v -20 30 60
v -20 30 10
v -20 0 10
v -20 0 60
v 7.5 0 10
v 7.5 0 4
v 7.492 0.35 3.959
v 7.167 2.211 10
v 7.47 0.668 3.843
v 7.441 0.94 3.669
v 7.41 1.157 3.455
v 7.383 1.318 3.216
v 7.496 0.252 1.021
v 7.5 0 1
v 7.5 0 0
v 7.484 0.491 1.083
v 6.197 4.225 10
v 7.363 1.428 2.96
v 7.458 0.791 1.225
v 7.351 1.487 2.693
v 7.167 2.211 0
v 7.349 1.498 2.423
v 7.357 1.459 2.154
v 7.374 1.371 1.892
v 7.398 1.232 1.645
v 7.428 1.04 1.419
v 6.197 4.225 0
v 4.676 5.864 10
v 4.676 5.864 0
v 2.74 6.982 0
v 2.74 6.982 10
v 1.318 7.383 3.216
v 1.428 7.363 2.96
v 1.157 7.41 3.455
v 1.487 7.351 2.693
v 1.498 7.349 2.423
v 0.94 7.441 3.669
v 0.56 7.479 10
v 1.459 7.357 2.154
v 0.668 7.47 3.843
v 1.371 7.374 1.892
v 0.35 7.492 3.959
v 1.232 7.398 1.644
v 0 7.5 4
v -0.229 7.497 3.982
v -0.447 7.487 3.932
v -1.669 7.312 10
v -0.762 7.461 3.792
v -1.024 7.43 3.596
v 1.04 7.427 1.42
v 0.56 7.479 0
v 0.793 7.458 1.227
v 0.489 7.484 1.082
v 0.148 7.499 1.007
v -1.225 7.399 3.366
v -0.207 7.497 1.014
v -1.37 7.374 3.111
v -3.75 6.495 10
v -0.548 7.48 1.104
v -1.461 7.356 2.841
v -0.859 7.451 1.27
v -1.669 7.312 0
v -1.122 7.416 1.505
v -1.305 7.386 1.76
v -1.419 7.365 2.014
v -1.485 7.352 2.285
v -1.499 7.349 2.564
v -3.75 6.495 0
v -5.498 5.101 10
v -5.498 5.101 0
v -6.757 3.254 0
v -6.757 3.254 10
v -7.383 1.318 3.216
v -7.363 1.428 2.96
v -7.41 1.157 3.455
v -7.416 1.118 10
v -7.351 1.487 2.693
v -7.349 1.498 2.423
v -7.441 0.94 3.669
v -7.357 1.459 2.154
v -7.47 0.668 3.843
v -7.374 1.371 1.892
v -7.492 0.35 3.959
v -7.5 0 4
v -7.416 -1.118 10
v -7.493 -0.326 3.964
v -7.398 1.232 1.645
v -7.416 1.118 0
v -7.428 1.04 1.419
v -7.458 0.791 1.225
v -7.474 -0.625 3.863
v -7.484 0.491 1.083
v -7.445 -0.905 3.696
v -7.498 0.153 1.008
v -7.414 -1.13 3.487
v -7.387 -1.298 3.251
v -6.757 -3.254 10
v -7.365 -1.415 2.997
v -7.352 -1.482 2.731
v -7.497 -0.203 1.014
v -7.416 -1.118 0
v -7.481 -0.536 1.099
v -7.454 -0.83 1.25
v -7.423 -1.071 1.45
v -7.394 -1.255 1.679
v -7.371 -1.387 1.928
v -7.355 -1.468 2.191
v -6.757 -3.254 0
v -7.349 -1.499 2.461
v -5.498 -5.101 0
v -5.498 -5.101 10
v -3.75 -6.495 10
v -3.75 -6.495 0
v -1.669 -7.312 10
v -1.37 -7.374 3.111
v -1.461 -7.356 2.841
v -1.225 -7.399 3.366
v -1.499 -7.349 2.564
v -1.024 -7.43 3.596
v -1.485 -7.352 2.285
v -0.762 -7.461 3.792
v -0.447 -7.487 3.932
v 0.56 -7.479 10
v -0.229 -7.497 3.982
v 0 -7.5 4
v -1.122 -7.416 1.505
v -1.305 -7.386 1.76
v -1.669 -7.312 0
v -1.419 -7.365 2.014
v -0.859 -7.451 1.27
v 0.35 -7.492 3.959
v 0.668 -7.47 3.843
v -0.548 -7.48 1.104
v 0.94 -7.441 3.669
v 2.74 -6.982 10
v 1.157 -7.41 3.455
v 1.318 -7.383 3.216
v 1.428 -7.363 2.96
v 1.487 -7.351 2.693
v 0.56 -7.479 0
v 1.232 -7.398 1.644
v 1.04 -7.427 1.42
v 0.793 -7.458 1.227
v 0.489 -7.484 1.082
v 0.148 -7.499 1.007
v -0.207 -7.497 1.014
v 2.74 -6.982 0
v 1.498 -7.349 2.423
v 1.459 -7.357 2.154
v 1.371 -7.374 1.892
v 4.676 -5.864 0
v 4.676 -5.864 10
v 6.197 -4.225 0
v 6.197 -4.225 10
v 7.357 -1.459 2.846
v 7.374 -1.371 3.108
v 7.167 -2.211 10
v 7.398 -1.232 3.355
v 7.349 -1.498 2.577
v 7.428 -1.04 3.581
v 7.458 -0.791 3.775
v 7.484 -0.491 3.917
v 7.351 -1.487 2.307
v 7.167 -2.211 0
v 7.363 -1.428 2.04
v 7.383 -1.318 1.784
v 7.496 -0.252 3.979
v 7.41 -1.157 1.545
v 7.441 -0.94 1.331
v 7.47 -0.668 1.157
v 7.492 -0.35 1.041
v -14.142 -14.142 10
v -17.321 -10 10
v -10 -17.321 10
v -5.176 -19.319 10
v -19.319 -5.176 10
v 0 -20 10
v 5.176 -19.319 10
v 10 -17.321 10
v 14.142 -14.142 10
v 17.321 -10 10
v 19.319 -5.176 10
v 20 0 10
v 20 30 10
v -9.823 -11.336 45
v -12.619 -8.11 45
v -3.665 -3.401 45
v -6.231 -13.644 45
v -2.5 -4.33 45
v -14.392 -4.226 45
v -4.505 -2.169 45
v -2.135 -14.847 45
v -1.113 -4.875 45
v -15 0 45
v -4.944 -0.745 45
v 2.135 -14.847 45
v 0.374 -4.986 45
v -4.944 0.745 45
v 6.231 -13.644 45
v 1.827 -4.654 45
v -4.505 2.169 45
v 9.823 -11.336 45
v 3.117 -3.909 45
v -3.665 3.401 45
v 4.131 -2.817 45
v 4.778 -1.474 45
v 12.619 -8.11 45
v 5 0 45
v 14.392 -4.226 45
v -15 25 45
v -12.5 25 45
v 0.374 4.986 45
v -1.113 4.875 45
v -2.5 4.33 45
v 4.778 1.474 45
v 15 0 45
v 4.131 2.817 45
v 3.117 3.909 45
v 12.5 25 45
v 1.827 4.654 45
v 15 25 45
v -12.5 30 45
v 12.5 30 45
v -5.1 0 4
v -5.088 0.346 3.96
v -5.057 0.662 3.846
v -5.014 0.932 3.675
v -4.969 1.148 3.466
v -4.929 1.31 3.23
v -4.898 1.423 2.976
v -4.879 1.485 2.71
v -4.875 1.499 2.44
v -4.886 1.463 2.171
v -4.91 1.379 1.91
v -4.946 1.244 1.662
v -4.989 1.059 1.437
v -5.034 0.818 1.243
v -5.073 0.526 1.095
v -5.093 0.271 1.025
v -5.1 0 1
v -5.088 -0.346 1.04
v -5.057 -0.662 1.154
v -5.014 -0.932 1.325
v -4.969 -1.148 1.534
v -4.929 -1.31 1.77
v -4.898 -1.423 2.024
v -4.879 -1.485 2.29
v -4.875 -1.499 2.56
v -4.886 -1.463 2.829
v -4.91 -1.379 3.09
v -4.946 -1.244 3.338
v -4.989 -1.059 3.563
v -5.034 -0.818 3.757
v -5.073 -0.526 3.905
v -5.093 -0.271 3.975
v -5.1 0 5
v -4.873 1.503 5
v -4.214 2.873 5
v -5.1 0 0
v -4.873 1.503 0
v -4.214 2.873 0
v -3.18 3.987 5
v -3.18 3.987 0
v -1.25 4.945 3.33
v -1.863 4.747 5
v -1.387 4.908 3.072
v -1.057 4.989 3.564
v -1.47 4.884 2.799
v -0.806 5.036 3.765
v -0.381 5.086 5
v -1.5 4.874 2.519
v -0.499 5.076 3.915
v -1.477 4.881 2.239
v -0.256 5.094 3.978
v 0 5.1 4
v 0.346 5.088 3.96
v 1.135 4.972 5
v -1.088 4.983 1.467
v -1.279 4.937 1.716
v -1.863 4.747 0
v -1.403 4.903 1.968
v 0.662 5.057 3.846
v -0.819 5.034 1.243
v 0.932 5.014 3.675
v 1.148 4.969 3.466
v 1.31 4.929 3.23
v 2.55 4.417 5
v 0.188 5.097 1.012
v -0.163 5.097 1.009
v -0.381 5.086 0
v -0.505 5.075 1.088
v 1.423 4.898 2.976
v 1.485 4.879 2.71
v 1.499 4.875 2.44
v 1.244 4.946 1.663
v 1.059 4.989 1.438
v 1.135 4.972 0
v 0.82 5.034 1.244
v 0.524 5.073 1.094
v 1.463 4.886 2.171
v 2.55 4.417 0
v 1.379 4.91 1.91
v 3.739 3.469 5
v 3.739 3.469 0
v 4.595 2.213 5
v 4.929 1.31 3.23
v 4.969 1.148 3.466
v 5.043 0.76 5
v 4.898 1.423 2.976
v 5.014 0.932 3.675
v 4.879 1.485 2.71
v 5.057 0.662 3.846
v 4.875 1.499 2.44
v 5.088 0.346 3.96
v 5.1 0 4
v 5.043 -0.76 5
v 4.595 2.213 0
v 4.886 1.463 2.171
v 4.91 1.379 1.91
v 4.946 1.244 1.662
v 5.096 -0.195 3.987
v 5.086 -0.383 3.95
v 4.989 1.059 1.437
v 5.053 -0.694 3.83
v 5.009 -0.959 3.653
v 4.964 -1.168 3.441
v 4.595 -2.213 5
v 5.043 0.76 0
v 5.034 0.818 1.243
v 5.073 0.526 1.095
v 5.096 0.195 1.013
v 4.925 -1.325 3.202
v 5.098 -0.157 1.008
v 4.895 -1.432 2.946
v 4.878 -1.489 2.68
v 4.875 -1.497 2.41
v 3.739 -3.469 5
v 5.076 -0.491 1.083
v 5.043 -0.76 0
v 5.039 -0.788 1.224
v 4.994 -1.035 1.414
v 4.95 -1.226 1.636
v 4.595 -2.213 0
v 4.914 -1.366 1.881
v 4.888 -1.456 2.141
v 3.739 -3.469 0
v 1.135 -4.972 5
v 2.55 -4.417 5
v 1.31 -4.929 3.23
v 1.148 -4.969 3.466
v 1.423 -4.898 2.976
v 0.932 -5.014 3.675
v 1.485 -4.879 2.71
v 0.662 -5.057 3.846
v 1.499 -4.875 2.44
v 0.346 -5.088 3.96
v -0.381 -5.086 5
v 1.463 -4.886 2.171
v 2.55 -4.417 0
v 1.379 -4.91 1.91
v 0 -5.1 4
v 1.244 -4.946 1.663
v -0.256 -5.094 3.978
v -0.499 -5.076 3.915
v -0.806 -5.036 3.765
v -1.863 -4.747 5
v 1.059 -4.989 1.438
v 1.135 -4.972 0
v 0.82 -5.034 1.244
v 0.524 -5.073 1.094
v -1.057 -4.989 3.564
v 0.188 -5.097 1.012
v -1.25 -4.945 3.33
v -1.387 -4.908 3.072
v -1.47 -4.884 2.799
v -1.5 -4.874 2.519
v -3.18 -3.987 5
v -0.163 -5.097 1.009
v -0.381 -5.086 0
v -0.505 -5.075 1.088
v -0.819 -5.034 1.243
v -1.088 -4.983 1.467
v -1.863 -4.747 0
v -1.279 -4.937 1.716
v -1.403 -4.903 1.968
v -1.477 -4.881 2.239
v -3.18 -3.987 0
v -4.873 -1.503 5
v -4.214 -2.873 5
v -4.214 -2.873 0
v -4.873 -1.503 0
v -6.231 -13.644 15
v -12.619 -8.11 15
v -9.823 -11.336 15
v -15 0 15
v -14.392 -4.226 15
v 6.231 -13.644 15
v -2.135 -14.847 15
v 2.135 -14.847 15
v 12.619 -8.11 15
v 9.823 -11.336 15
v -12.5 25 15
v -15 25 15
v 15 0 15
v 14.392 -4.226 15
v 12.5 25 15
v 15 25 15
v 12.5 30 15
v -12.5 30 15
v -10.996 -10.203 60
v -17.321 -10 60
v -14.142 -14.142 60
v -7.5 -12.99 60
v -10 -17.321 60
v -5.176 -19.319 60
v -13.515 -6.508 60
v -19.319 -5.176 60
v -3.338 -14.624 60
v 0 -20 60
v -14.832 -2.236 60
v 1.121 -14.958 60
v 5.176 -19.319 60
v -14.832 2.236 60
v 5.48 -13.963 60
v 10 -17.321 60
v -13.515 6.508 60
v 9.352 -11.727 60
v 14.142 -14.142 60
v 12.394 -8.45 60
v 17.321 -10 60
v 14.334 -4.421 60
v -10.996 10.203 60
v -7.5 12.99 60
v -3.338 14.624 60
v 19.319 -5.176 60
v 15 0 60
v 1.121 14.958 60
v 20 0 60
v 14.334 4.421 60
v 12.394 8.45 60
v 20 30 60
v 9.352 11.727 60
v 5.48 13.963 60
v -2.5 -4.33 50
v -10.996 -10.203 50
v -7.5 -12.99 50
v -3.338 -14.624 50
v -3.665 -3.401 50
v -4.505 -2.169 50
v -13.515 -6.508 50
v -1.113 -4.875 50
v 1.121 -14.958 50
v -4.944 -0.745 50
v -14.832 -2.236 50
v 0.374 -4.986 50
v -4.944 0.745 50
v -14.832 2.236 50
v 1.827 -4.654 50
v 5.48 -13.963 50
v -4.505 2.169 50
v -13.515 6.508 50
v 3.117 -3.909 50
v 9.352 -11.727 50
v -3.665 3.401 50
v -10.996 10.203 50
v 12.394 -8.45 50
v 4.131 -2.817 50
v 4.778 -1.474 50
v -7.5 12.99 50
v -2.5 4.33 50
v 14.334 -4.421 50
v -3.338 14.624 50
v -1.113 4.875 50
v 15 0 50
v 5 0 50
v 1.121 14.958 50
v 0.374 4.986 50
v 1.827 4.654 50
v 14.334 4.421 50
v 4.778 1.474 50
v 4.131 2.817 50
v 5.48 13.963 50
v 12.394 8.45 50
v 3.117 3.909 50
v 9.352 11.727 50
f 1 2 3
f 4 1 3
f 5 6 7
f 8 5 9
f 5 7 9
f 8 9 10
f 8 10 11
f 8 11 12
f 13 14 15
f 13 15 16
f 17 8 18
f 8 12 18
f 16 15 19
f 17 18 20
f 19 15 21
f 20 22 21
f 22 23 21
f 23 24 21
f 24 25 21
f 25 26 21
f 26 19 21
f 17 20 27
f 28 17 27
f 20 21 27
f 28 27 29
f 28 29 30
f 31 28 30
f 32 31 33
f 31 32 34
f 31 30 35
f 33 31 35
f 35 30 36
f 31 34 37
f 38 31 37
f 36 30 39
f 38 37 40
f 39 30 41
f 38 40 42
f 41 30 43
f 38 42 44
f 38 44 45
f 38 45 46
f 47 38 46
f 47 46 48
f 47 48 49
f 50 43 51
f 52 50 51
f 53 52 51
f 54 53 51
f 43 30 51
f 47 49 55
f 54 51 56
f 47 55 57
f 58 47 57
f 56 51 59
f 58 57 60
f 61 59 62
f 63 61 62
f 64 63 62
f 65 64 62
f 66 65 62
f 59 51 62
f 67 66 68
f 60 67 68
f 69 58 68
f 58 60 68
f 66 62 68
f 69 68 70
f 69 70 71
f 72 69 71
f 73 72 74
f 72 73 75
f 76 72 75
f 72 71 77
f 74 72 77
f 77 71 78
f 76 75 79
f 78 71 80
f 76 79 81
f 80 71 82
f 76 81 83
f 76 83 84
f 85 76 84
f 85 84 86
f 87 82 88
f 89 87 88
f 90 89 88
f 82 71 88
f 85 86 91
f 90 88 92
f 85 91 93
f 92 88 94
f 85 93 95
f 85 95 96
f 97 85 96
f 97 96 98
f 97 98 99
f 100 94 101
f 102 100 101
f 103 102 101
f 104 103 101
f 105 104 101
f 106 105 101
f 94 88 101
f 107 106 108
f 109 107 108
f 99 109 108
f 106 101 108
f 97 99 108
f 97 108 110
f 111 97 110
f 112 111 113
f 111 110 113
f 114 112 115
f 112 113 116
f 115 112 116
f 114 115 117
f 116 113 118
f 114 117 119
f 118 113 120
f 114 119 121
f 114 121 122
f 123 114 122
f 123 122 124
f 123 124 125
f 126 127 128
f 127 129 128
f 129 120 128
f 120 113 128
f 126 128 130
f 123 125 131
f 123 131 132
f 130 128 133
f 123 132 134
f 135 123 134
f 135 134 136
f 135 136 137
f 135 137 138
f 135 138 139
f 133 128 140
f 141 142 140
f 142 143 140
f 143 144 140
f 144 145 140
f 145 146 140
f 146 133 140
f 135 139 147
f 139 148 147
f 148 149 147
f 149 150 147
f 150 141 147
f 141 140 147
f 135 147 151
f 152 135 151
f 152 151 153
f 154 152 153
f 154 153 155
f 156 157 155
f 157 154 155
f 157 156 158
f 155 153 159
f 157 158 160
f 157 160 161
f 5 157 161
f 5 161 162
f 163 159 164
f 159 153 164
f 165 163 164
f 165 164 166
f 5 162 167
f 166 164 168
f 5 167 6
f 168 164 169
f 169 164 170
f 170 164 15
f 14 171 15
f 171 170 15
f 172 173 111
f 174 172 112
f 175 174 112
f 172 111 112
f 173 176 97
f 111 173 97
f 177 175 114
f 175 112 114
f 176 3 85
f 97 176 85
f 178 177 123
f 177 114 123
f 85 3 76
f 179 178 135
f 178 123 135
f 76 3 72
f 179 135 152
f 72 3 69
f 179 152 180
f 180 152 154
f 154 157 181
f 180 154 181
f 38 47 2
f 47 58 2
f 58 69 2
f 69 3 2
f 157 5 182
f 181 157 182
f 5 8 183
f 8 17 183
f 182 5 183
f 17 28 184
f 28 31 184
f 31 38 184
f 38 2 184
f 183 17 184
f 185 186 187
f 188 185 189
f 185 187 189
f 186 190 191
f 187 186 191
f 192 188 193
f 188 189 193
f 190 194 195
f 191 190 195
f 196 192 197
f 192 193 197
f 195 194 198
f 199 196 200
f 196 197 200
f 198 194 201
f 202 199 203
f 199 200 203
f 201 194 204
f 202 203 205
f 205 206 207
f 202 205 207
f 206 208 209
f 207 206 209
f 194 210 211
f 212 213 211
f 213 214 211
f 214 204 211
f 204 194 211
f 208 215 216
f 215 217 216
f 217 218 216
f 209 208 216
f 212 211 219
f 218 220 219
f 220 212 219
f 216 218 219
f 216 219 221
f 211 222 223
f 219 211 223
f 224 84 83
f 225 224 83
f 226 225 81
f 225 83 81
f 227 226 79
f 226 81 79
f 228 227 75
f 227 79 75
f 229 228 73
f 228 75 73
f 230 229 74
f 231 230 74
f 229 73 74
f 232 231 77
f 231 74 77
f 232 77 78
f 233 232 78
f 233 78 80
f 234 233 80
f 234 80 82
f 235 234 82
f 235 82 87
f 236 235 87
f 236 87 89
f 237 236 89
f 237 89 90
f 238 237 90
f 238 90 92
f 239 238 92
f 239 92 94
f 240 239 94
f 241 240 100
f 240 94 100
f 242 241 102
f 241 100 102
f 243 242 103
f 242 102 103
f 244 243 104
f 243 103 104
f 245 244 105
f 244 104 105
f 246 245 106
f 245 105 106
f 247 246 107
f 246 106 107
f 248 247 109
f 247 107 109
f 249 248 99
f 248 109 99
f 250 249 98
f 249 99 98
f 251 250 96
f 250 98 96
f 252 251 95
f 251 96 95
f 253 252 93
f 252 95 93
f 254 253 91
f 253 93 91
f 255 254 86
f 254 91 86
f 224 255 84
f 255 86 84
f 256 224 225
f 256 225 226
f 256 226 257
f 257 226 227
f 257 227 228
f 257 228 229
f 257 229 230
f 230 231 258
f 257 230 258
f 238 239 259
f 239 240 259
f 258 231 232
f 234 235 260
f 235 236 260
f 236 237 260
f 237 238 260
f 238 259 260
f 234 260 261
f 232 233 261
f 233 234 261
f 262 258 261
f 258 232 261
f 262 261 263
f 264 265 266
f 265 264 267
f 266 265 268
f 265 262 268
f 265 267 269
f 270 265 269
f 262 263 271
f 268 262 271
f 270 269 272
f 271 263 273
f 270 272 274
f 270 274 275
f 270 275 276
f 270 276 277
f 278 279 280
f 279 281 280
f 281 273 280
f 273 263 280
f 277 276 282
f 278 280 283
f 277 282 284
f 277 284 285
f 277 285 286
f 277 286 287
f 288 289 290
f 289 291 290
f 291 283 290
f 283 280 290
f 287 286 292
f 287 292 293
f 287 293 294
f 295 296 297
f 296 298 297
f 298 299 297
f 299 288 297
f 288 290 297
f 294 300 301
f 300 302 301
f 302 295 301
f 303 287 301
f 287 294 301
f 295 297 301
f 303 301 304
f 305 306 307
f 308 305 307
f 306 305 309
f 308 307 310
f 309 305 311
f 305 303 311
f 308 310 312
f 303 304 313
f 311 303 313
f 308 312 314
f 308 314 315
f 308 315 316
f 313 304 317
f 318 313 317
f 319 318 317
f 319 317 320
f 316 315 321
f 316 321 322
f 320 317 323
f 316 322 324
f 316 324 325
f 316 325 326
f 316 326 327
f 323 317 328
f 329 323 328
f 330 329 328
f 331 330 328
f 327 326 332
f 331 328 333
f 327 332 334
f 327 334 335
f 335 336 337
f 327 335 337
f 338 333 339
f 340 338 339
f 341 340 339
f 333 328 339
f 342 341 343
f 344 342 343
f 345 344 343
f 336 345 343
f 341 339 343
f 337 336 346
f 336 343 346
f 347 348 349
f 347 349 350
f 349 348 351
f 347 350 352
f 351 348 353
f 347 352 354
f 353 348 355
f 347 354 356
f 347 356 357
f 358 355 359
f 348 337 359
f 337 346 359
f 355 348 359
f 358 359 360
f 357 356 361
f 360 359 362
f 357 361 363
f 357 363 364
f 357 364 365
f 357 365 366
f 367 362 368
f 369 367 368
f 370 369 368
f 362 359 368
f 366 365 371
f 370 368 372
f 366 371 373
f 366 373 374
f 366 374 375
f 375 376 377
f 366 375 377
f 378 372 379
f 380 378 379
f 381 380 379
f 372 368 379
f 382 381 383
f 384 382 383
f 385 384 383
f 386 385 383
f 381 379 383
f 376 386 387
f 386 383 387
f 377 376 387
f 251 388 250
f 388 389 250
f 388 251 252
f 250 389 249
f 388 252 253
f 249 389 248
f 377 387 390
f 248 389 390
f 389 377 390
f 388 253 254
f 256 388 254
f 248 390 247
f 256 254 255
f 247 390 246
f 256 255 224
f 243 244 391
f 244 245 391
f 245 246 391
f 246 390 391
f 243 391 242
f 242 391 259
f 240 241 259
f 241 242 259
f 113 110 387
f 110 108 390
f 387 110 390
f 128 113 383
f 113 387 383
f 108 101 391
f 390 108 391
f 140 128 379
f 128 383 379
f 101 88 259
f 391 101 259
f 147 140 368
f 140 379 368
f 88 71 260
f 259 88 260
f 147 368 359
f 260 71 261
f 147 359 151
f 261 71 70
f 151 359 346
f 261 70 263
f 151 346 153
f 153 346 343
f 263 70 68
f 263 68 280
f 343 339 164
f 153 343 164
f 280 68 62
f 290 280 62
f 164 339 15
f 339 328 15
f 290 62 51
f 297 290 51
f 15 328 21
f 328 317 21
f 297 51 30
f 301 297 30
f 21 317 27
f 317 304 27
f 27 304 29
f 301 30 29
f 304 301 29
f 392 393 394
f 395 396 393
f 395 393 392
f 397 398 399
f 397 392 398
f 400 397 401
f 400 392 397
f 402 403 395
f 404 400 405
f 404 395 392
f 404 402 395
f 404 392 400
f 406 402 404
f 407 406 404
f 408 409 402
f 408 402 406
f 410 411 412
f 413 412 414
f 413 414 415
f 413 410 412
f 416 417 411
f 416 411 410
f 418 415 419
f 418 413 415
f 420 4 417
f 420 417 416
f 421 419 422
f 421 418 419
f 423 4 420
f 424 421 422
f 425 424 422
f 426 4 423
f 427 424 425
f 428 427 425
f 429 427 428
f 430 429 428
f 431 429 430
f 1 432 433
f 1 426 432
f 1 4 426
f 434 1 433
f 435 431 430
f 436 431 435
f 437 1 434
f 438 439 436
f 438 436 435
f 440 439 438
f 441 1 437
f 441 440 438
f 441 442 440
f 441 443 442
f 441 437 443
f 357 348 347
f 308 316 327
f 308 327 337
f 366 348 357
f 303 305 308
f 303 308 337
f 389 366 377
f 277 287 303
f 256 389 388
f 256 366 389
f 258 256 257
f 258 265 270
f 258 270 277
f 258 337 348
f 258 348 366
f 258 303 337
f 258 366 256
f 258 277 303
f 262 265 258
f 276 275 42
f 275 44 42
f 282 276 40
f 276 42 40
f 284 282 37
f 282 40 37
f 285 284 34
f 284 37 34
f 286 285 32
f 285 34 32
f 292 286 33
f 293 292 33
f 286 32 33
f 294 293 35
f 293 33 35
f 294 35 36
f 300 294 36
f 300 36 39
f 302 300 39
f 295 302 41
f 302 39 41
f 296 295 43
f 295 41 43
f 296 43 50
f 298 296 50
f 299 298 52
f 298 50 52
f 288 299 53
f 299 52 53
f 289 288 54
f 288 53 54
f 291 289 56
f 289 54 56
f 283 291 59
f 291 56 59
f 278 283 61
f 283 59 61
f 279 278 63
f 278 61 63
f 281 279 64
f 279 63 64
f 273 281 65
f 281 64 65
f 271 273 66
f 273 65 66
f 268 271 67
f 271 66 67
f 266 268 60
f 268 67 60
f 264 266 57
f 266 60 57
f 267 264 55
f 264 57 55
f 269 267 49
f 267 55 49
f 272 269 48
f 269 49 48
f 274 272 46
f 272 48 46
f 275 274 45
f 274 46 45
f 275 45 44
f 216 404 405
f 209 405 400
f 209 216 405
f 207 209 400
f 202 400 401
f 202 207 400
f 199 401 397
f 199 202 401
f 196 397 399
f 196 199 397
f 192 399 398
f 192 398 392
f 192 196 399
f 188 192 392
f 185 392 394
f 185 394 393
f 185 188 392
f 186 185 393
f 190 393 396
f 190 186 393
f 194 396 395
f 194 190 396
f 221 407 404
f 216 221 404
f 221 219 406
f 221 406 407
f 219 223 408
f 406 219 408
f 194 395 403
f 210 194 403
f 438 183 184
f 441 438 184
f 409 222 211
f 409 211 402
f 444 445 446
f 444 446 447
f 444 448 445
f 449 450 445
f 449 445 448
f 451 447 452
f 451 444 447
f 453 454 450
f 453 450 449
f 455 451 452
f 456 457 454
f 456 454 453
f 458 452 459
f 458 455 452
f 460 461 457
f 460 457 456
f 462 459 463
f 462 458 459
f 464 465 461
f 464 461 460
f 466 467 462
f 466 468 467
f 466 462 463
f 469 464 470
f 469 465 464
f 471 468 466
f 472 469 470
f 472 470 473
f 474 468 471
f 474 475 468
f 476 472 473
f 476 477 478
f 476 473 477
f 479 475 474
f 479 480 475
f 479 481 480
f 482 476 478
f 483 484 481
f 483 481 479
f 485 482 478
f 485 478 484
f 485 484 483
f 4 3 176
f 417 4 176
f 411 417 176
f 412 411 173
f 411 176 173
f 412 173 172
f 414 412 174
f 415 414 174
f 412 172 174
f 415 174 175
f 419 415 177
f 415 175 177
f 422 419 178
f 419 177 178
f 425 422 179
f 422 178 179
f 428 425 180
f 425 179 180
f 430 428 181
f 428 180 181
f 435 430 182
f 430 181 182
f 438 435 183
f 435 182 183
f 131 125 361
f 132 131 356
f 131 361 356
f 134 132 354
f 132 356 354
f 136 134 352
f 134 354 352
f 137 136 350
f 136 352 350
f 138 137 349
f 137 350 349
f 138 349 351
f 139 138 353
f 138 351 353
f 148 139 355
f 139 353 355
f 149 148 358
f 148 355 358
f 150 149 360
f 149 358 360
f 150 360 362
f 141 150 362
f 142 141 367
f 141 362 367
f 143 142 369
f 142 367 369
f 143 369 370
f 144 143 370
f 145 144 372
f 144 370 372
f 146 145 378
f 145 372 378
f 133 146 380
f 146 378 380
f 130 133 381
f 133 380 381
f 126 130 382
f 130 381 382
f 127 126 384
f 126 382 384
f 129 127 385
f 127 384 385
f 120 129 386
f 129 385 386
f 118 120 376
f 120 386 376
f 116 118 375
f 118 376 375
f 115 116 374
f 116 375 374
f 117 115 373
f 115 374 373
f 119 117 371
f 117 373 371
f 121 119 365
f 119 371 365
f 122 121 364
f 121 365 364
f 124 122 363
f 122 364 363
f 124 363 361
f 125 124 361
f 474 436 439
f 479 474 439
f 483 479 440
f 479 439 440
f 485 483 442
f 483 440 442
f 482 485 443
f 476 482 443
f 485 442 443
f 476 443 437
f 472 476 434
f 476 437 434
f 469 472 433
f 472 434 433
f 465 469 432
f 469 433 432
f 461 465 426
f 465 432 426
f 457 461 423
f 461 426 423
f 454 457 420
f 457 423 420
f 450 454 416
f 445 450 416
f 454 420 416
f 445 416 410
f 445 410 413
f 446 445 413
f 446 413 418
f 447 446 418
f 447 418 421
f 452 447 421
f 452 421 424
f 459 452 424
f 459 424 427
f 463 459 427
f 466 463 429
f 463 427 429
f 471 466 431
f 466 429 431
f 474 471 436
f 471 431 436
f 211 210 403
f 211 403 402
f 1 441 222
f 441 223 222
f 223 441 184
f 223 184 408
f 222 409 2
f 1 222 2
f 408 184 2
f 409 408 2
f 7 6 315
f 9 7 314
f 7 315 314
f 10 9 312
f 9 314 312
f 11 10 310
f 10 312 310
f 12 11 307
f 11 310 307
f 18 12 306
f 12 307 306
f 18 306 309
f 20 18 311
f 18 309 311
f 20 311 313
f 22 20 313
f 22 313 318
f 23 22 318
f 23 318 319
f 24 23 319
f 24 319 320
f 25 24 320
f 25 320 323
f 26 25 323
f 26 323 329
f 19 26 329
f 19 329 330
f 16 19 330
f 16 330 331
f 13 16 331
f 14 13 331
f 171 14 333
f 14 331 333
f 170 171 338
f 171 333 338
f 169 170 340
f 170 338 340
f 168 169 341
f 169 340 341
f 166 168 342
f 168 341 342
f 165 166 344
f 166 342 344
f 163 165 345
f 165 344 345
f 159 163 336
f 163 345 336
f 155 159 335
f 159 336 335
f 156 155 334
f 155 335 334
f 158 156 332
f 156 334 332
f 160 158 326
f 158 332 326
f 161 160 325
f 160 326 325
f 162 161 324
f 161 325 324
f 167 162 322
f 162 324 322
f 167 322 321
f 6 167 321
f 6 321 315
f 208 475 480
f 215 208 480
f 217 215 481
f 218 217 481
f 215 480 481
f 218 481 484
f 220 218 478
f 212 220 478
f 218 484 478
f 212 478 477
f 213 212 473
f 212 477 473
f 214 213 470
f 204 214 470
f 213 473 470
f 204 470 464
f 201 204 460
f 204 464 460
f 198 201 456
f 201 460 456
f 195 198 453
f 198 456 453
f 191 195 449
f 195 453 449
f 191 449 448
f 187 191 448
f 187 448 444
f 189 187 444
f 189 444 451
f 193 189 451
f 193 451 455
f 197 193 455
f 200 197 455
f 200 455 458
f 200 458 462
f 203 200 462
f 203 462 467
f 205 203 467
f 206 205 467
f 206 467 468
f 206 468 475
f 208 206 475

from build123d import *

# Parameters (mm, degrees)
SKETCH1_R           = 7.5
BOSS_EXTRUDE1_DEPTH = 10
BOSS_EXTRUDE2_DEPTH = 50
SKETCH3_R           = 15
CUT_EXTRUDE1_DEPTH  = 10
CUT_EXTRUDE2_START  = -30
CUT_EXTRUDE2_DEPTH  = 30
SKETCH6_W           = 25
SKETCH6_H           = 30
CUT_EXTRUDE3_DEPTH  = 30
SKETCH7_R           = 5
CUT_EXTRUDE4_DEPTH  = 30
SKETCH8_R           = 5.1
CUT_EXTRUDE5_DEPTH  = 5
SKETCH9_R           = 1.5
CUT_EXTRUDE6_DEPTH  = 71
CIRPATTERN1_COUNT   = 2
CIRPATTERN1_ANGLE   = 90


with BuildPart() as part:
    # Sketch1 → Boss-Extrude1 (new body)
    with BuildSketch(Plane.XY):
        Circle(SKETCH1_R)
    extrude(amount=BOSS_EXTRUDE1_DEPTH)

    # Sketch2 → Boss-Extrude2 (add)
    with BuildSketch(Plane.XY.offset(10)):
        with BuildLine():
            Line((20, 0), (20, 30))
            Line((20, 30), (-20, 30))
            Line((-20, 30), (-20, 0))
            ThreePointArc((-20, 0), (0, -20), (20, 0))
        make_face()
    extrude(amount=BOSS_EXTRUDE2_DEPTH)

    # Sketch3 → Cut-Extrude1 (cut)
    with BuildSketch(Plane.XY.offset(60)):
        Circle(SKETCH3_R)
    extrude(amount=-CUT_EXTRUDE1_DEPTH, mode=Mode.SUBTRACT)

    # Sketch5 → Cut-Extrude2 (cut)
    with BuildSketch(Plane(origin=(0, 0, 15), x_dir=(-1, 0, 0), z_dir=(0, 0, -1)).offset(CUT_EXTRUDE2_START)):
        with BuildLine():
            Line((15, 25), (-15, 25))
            Line((-15, 25), (-15, 0))
            ThreePointArc((-15, 0), (0, -15), (15, 0))
            Line((15, 0), (15, 25))
        make_face()
    extrude(amount=CUT_EXTRUDE2_DEPTH, mode=Mode.SUBTRACT)

    # Sketch6 → Cut-Extrude3 (cut)
    with BuildSketch(Plane(origin=(0, 30, 0), x_dir=(1, 0, 0), z_dir=(0, 1, 0))):
        with Locations((0, -30)):
            Rectangle(SKETCH6_W, SKETCH6_H)
    extrude(amount=-CUT_EXTRUDE3_DEPTH, mode=Mode.SUBTRACT)

    # Sketch7 → Cut-Extrude4 (cut)
    with BuildSketch(Plane.XY.offset(50)):
        Circle(SKETCH7_R)
    extrude(amount=-CUT_EXTRUDE4_DEPTH, mode=Mode.SUBTRACT)

    # Sketch8 → Cut-Extrude5 (cut)
    with BuildSketch(Plane(origin=(0, 0, 0), x_dir=(-1, 0, 0), z_dir=(0, 0, -1))):
        Circle(SKETCH8_R)
    extrude(amount=-CUT_EXTRUDE5_DEPTH, mode=Mode.SUBTRACT)

    # Sketch9 → Cut-Extrude6 (cut, symmetric)
    with BuildSketch(Plane(origin=(0, 0, 0), x_dir=(1, 0, 0), z_dir=(0, 1, 0))):
        with Locations(Location((0, -2.5, 0), (0, 0, 270))):
            Circle(SKETCH9_R)
    cut_extrude6 = extrude(amount=CUT_EXTRUDE6_DEPTH, both=True, mode=Mode.SUBTRACT)

    # CirPattern1: Cut-Extrude6 ×2 about axis
    cirpattern1_axis = Axis((0, 0, 0), (0, 0, 1))
    for i in range(1, CIRPATTERN1_COUNT):
        add(cut_extrude6.rotate(cirpattern1_axis, i * CIRPATTERN1_ANGLE / (CIRPATTERN1_COUNT - 1)), mode=Mode.SUBTRACT)


solid = part.part
